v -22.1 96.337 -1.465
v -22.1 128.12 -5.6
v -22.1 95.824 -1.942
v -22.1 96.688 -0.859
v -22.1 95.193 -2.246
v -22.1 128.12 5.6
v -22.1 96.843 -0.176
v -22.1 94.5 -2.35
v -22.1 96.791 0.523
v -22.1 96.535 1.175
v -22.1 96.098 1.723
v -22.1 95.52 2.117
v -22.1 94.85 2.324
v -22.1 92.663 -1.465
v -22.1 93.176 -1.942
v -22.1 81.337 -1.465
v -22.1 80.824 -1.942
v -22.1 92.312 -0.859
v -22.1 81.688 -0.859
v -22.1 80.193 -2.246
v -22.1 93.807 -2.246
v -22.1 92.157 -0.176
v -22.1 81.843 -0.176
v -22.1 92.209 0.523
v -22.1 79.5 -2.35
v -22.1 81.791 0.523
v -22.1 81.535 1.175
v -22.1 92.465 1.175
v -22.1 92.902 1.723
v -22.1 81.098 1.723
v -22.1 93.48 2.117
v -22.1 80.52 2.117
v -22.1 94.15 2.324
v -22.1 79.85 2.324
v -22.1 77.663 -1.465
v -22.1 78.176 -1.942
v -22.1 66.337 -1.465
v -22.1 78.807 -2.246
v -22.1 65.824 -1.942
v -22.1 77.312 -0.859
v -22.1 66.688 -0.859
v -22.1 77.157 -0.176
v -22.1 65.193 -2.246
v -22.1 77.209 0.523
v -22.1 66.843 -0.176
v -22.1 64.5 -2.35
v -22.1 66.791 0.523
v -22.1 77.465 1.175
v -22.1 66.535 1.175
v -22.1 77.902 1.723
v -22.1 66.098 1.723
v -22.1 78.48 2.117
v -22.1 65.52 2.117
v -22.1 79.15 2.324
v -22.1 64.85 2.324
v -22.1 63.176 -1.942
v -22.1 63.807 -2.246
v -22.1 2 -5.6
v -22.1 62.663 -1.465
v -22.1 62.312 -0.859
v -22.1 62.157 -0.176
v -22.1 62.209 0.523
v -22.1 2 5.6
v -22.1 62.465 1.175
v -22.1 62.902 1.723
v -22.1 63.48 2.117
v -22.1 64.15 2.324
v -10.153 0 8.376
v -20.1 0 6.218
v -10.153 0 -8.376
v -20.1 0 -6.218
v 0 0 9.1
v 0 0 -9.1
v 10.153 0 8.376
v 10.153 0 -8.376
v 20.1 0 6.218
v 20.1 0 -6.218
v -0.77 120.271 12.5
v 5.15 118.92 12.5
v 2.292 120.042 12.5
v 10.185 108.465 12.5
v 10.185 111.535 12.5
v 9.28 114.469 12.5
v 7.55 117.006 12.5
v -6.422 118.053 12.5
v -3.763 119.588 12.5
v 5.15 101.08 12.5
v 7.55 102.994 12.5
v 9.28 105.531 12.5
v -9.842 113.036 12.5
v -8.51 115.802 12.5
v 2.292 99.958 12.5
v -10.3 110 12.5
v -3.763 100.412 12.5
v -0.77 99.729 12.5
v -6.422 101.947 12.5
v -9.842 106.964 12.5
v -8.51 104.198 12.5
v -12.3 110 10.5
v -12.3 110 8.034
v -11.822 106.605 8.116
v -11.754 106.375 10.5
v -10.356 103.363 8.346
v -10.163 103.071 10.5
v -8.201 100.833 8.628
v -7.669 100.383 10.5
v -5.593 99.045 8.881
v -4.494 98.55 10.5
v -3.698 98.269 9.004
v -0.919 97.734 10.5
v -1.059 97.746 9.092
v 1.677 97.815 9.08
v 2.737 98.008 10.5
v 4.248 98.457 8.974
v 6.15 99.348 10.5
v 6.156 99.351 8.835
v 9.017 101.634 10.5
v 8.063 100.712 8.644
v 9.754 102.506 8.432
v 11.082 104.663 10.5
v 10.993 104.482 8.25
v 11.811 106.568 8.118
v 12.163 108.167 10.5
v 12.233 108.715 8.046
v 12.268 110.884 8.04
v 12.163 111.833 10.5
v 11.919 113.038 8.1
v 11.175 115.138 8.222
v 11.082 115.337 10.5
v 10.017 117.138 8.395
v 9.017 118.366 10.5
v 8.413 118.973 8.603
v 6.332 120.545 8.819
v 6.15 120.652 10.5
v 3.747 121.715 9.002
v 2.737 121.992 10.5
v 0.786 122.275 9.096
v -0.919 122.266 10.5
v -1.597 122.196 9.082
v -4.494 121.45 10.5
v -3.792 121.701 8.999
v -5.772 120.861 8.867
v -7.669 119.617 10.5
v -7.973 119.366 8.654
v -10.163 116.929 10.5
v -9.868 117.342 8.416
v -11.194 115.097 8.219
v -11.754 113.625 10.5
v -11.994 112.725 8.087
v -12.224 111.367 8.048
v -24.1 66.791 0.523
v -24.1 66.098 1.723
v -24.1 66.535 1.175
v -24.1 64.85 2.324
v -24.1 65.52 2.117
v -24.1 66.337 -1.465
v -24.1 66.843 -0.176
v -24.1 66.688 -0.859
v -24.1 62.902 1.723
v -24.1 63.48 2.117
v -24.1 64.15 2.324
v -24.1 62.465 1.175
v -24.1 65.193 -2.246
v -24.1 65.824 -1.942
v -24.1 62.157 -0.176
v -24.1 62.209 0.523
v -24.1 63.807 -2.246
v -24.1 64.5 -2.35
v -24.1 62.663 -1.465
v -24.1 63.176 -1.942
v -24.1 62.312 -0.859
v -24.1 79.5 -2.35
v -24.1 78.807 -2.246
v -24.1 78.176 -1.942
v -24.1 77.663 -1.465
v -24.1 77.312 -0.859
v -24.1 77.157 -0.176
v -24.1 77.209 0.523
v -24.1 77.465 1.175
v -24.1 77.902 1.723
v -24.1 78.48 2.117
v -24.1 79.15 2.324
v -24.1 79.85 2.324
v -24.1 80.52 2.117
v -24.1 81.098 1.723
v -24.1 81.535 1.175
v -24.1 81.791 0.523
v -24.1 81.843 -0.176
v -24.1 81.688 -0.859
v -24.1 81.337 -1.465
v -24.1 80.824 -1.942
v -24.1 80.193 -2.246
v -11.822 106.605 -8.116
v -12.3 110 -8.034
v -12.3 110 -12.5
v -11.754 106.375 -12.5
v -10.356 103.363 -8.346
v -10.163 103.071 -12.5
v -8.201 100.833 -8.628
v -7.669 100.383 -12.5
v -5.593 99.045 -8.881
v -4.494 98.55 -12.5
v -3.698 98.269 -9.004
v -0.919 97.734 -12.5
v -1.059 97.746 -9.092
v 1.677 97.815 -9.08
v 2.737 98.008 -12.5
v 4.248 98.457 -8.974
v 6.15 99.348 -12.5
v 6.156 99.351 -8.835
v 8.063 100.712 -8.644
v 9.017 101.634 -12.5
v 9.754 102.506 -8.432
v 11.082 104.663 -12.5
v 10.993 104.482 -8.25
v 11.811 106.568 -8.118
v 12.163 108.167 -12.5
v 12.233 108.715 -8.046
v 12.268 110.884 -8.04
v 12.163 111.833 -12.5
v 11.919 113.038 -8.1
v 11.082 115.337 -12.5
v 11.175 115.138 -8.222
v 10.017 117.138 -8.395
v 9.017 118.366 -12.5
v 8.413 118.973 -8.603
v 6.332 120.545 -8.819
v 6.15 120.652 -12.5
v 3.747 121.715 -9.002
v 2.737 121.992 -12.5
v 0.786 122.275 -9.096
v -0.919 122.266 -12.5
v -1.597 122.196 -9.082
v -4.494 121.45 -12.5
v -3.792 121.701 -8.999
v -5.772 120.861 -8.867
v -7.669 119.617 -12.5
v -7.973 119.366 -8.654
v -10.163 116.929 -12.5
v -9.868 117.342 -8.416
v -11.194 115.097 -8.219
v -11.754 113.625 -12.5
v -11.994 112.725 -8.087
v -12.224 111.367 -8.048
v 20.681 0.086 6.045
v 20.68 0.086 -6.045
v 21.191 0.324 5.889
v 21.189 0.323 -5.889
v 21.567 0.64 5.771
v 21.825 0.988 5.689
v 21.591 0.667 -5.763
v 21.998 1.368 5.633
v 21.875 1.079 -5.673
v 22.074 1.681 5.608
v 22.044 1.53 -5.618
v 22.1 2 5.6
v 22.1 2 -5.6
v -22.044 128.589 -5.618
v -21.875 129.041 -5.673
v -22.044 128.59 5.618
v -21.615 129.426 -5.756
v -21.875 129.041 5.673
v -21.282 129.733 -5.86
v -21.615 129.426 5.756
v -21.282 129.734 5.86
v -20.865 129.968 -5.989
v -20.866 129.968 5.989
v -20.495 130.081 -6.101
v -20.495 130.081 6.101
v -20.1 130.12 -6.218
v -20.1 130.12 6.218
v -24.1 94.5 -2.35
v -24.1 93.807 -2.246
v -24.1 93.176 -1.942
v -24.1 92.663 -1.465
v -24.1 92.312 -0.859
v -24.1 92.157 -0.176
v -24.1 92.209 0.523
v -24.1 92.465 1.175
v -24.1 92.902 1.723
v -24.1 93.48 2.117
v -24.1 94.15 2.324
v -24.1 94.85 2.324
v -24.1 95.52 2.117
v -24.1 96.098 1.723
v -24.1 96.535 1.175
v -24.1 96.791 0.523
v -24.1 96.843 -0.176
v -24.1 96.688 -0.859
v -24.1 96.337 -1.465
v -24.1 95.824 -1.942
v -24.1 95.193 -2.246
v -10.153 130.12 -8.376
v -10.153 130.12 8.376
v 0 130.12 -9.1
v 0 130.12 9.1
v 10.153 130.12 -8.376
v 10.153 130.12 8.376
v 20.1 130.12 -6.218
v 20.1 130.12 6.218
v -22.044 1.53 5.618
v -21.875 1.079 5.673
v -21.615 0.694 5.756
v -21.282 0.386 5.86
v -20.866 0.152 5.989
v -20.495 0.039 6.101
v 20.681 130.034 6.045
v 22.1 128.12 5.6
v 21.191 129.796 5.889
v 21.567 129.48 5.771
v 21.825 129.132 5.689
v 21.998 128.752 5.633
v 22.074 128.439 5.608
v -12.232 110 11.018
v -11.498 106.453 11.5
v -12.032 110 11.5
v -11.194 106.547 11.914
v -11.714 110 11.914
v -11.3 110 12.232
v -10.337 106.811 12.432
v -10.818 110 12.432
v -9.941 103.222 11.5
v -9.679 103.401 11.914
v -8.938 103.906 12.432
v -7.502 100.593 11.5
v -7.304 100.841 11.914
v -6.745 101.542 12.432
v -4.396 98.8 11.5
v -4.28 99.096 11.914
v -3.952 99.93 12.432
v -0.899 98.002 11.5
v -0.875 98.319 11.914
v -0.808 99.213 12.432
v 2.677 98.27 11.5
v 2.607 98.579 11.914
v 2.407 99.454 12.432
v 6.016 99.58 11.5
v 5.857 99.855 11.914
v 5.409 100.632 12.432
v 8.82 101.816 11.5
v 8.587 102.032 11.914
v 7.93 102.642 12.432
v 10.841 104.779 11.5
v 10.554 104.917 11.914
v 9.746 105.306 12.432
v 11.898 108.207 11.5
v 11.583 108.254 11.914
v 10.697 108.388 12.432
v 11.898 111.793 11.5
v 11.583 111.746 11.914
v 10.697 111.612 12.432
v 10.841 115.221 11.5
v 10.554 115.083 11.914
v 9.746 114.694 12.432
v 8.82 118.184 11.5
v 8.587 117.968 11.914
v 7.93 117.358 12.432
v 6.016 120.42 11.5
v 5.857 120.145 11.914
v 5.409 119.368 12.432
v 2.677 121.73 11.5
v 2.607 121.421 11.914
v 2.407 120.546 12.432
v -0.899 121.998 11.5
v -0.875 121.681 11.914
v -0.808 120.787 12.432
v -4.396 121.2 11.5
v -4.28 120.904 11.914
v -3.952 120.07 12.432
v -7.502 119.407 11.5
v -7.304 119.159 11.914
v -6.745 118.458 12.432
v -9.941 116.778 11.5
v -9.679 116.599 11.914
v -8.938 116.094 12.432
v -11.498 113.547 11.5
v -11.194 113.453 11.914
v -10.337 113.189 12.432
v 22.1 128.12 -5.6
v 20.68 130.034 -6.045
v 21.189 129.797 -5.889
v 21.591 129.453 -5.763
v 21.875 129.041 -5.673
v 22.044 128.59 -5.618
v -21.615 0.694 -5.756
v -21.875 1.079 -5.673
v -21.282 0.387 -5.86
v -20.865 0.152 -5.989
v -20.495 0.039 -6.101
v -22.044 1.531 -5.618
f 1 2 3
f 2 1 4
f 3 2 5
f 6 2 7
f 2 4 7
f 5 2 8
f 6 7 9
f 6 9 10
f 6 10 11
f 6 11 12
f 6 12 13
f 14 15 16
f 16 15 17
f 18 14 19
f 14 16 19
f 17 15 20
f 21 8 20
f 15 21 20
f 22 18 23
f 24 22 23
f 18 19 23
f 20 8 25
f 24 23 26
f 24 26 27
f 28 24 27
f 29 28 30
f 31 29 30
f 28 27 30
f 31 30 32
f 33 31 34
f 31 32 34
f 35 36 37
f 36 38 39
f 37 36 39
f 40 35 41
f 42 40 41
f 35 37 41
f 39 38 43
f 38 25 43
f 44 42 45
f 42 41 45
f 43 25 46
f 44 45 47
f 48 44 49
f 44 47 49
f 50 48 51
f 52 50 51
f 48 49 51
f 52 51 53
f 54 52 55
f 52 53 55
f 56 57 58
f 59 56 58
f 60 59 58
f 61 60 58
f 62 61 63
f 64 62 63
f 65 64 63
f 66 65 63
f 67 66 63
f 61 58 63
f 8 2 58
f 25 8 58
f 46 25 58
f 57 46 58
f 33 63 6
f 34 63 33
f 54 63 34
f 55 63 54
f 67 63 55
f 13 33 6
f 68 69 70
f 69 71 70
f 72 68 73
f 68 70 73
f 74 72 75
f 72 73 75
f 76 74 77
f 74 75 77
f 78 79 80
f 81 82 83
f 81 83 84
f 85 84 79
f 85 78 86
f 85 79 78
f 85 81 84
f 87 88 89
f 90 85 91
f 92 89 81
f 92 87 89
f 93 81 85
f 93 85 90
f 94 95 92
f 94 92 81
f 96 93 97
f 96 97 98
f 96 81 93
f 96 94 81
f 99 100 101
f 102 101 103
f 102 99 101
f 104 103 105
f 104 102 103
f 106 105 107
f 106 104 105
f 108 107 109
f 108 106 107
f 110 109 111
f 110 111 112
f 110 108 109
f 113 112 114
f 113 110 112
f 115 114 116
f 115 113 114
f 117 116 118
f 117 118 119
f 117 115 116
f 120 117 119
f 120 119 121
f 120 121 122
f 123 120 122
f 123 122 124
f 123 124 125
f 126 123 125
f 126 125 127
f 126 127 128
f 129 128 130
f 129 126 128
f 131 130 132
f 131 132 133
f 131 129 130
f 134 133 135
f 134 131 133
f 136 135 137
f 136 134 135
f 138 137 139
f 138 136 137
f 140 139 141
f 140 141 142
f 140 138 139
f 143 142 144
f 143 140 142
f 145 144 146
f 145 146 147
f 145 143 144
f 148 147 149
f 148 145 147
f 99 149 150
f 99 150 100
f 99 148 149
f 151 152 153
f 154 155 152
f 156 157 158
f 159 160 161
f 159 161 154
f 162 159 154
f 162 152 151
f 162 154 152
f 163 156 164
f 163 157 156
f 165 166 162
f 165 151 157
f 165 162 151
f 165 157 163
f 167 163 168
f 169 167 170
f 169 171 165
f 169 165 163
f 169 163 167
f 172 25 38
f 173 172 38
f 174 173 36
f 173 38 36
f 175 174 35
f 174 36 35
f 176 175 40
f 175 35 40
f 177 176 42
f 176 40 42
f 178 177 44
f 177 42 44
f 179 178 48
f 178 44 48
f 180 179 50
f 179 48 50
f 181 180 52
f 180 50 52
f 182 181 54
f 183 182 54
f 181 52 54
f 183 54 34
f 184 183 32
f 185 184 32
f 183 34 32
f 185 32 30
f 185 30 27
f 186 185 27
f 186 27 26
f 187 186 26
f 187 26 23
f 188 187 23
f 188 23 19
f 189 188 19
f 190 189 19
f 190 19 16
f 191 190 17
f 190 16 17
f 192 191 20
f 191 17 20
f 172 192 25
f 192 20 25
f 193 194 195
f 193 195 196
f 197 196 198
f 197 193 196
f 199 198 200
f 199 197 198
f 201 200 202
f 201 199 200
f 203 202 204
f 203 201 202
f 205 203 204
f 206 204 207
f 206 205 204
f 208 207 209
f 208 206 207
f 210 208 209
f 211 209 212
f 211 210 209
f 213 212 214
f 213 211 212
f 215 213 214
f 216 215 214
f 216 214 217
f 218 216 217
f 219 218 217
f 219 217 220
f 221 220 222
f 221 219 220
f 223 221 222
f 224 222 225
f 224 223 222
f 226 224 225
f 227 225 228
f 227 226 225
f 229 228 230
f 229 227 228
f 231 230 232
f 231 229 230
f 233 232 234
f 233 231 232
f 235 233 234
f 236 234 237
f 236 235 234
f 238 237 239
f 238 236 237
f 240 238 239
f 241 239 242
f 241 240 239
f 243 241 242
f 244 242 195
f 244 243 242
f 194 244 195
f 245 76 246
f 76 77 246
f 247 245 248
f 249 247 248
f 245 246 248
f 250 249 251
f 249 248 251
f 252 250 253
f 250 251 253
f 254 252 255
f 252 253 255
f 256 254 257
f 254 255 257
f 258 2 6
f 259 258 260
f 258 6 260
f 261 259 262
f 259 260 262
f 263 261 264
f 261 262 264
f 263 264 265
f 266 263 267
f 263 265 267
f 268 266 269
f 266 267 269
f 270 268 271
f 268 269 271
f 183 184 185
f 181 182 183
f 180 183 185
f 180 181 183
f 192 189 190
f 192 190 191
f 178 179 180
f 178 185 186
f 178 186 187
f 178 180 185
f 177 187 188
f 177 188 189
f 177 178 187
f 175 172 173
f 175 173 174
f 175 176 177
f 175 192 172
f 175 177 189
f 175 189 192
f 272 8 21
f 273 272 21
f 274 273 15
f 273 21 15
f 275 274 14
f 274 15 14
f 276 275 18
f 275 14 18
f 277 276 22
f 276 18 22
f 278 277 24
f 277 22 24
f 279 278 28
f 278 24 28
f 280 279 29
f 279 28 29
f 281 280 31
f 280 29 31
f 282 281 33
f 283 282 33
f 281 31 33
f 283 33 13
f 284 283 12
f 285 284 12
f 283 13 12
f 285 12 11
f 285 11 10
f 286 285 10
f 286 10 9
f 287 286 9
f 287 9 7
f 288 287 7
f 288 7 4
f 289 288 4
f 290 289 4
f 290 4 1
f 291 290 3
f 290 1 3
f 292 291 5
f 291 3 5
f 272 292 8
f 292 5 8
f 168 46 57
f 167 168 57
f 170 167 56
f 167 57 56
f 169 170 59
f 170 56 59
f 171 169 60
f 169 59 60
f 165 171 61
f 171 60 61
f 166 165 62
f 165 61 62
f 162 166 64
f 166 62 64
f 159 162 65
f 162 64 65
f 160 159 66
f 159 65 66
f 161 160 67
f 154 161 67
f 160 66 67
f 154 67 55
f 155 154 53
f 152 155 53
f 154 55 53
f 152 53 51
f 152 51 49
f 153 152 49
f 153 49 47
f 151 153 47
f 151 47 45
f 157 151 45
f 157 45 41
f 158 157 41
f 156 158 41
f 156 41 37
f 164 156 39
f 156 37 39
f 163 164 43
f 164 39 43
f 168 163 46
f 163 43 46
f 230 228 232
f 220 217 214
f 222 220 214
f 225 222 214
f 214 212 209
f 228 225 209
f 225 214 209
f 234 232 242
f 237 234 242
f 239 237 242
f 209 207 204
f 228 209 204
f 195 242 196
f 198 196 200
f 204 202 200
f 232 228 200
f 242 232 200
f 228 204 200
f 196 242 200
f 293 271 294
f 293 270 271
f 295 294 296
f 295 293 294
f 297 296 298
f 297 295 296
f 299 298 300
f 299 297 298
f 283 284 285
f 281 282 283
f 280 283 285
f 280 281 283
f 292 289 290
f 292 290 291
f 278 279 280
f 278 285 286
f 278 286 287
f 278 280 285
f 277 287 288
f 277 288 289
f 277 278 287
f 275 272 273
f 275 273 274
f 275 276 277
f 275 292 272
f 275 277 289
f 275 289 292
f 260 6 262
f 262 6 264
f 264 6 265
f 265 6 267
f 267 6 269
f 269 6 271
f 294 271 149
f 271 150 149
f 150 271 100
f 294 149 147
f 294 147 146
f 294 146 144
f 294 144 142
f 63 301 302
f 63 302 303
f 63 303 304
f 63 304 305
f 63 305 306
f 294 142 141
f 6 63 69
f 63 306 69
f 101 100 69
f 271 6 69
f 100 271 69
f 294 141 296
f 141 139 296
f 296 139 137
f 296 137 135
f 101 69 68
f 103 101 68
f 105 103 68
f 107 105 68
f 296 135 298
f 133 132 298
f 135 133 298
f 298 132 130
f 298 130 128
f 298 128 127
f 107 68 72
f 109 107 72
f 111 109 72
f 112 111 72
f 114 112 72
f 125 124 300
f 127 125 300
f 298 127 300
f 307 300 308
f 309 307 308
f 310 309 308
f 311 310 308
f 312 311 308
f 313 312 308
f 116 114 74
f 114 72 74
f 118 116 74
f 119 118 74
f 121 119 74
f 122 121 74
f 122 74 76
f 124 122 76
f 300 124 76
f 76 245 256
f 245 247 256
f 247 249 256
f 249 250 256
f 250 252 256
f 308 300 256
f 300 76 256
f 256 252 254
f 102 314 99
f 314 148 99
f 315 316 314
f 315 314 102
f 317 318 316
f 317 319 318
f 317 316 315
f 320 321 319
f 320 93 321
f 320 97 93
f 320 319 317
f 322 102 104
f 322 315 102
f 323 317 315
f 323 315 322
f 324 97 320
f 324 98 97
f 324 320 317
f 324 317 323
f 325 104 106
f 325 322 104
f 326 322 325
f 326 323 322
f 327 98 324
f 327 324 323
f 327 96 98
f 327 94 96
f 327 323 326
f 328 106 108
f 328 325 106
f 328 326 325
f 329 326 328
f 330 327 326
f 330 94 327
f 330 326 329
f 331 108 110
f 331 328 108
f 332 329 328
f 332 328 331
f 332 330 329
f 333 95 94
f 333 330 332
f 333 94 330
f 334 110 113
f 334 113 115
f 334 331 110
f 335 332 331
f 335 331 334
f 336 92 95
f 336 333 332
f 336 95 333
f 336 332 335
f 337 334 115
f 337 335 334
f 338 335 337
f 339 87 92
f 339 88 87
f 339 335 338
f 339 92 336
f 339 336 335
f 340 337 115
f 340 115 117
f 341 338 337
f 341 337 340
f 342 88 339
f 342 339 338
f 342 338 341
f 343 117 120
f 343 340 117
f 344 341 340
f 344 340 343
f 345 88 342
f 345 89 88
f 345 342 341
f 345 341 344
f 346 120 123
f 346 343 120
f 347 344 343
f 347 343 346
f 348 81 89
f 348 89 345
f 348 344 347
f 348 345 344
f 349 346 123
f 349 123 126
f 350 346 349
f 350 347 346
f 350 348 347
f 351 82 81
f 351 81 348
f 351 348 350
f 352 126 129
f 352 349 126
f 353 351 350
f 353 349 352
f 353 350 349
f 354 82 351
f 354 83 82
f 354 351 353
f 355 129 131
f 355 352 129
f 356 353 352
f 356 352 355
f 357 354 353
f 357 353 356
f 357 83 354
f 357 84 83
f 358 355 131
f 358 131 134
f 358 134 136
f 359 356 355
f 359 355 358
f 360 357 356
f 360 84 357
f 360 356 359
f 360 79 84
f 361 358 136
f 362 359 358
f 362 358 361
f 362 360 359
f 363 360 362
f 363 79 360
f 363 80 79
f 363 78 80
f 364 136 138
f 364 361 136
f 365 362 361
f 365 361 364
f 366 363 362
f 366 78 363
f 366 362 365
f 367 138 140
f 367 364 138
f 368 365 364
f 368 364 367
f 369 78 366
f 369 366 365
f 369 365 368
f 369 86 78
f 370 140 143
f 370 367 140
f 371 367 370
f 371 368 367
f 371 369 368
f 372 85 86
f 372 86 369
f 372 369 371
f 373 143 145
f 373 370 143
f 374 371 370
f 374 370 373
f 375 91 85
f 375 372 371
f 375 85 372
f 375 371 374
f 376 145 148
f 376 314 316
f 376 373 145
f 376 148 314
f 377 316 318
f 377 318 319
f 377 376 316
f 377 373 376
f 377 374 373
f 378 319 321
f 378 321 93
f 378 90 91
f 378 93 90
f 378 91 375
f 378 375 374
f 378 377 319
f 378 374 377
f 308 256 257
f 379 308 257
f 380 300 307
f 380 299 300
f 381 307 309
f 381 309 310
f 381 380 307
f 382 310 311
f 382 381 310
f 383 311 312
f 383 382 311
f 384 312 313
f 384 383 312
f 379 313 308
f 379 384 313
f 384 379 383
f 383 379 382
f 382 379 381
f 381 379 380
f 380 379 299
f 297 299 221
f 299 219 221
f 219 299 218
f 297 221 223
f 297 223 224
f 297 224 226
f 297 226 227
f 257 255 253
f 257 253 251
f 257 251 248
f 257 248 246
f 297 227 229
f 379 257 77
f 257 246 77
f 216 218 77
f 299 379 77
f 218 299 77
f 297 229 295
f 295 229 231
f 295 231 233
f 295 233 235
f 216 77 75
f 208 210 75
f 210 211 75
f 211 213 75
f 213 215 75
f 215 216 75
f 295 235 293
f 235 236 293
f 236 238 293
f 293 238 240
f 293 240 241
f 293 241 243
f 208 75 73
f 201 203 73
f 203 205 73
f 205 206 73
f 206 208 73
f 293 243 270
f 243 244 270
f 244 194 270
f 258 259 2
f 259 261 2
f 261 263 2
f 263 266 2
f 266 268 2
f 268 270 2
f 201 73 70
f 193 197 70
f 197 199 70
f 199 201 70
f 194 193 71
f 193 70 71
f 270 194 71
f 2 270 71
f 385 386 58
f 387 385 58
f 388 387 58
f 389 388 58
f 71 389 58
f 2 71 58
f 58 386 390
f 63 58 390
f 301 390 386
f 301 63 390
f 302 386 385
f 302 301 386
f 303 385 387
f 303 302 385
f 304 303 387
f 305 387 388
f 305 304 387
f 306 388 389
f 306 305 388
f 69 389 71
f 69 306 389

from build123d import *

# Parameters (mm, degrees)
BOSS_EXTRUDE1_DEPTH = 130.12
SKETCH6_R           = 12.3
BOSS_EXTRUDE2_DEPTH = 12.5
SKETCH7_R           = 2.35
BOSS_EXTRUDE3_DEPTH = 2
FILLET1_R           = 2
FILLET2_R           = 2
FILLET3_R           = 2


with BuildPart() as part:
    # Sketch5 → Boss-Extrude1 (new body)
    with BuildSketch(Plane(origin=(0, 0, 0), x_dir=(1, 0, 0), z_dir=(0, 1, 0))):
        with BuildLine():
            Line((-22.1, 5.6), (-22.1, -5.6))
            ThreePointArc((-22.1, -5.6), (0, -9.1), (22.1, -5.6))
            Line((22.1, -5.6), (22.1, 5.6))
            ThreePointArc((22.1, 5.6), (0, 9.1), (-22.1, 5.6))
        make_face()
    extrude(amount=BOSS_EXTRUDE1_DEPTH)

    # Sketch6 → Boss-Extrude2 (add, symmetric)
    with BuildSketch(Plane.XY):
        with Locations(Location((0, 110, 0), (0, 0, 180))):
            Circle(SKETCH6_R)
    extrude(amount=BOSS_EXTRUDE2_DEPTH, both=True)

    # Sketch7 → Boss-Extrude3 (add)
    with BuildSketch(Plane.ZY.offset(22.1)):
        with Locations(Location((0, 94.5, 0), (0, 0, 180))):
            Circle(SKETCH7_R)
        with Locations(Location((0, 79.5, 0), (0, 0, 180))):
            Circle(SKETCH7_R)
        with Locations(Location((0, 64.5, 0), (0, 0, 180))):
            Circle(SKETCH7_R)
    extrude(amount=BOSS_EXTRUDE3_DEPTH)

    # Fillet1
    fillet1_edges = [part.edges().sort_by_distance(p)[0] for p in [
        (12.3, 110, 12.5),
    ]]
    fillet(fillet1_edges, radius=FILLET1_R)

    # Fillet2
    fillet2_edges = [part.edges().sort_by_distance(p)[0] for p in [
        (22.1, 130.12, 0),
        (-22.1, 130.12, 0),
    ]]
    fillet(fillet2_edges, radius=FILLET2_R)

    # Fillet3
    fillet3_edges = [part.edges().sort_by_distance(p)[0] for p in [
        (22.1, 0, 0),
        (-22.1, 0, 0),
    ]]
    fillet(fillet3_edges, radius=FILLET3_R)


solid = part.part
